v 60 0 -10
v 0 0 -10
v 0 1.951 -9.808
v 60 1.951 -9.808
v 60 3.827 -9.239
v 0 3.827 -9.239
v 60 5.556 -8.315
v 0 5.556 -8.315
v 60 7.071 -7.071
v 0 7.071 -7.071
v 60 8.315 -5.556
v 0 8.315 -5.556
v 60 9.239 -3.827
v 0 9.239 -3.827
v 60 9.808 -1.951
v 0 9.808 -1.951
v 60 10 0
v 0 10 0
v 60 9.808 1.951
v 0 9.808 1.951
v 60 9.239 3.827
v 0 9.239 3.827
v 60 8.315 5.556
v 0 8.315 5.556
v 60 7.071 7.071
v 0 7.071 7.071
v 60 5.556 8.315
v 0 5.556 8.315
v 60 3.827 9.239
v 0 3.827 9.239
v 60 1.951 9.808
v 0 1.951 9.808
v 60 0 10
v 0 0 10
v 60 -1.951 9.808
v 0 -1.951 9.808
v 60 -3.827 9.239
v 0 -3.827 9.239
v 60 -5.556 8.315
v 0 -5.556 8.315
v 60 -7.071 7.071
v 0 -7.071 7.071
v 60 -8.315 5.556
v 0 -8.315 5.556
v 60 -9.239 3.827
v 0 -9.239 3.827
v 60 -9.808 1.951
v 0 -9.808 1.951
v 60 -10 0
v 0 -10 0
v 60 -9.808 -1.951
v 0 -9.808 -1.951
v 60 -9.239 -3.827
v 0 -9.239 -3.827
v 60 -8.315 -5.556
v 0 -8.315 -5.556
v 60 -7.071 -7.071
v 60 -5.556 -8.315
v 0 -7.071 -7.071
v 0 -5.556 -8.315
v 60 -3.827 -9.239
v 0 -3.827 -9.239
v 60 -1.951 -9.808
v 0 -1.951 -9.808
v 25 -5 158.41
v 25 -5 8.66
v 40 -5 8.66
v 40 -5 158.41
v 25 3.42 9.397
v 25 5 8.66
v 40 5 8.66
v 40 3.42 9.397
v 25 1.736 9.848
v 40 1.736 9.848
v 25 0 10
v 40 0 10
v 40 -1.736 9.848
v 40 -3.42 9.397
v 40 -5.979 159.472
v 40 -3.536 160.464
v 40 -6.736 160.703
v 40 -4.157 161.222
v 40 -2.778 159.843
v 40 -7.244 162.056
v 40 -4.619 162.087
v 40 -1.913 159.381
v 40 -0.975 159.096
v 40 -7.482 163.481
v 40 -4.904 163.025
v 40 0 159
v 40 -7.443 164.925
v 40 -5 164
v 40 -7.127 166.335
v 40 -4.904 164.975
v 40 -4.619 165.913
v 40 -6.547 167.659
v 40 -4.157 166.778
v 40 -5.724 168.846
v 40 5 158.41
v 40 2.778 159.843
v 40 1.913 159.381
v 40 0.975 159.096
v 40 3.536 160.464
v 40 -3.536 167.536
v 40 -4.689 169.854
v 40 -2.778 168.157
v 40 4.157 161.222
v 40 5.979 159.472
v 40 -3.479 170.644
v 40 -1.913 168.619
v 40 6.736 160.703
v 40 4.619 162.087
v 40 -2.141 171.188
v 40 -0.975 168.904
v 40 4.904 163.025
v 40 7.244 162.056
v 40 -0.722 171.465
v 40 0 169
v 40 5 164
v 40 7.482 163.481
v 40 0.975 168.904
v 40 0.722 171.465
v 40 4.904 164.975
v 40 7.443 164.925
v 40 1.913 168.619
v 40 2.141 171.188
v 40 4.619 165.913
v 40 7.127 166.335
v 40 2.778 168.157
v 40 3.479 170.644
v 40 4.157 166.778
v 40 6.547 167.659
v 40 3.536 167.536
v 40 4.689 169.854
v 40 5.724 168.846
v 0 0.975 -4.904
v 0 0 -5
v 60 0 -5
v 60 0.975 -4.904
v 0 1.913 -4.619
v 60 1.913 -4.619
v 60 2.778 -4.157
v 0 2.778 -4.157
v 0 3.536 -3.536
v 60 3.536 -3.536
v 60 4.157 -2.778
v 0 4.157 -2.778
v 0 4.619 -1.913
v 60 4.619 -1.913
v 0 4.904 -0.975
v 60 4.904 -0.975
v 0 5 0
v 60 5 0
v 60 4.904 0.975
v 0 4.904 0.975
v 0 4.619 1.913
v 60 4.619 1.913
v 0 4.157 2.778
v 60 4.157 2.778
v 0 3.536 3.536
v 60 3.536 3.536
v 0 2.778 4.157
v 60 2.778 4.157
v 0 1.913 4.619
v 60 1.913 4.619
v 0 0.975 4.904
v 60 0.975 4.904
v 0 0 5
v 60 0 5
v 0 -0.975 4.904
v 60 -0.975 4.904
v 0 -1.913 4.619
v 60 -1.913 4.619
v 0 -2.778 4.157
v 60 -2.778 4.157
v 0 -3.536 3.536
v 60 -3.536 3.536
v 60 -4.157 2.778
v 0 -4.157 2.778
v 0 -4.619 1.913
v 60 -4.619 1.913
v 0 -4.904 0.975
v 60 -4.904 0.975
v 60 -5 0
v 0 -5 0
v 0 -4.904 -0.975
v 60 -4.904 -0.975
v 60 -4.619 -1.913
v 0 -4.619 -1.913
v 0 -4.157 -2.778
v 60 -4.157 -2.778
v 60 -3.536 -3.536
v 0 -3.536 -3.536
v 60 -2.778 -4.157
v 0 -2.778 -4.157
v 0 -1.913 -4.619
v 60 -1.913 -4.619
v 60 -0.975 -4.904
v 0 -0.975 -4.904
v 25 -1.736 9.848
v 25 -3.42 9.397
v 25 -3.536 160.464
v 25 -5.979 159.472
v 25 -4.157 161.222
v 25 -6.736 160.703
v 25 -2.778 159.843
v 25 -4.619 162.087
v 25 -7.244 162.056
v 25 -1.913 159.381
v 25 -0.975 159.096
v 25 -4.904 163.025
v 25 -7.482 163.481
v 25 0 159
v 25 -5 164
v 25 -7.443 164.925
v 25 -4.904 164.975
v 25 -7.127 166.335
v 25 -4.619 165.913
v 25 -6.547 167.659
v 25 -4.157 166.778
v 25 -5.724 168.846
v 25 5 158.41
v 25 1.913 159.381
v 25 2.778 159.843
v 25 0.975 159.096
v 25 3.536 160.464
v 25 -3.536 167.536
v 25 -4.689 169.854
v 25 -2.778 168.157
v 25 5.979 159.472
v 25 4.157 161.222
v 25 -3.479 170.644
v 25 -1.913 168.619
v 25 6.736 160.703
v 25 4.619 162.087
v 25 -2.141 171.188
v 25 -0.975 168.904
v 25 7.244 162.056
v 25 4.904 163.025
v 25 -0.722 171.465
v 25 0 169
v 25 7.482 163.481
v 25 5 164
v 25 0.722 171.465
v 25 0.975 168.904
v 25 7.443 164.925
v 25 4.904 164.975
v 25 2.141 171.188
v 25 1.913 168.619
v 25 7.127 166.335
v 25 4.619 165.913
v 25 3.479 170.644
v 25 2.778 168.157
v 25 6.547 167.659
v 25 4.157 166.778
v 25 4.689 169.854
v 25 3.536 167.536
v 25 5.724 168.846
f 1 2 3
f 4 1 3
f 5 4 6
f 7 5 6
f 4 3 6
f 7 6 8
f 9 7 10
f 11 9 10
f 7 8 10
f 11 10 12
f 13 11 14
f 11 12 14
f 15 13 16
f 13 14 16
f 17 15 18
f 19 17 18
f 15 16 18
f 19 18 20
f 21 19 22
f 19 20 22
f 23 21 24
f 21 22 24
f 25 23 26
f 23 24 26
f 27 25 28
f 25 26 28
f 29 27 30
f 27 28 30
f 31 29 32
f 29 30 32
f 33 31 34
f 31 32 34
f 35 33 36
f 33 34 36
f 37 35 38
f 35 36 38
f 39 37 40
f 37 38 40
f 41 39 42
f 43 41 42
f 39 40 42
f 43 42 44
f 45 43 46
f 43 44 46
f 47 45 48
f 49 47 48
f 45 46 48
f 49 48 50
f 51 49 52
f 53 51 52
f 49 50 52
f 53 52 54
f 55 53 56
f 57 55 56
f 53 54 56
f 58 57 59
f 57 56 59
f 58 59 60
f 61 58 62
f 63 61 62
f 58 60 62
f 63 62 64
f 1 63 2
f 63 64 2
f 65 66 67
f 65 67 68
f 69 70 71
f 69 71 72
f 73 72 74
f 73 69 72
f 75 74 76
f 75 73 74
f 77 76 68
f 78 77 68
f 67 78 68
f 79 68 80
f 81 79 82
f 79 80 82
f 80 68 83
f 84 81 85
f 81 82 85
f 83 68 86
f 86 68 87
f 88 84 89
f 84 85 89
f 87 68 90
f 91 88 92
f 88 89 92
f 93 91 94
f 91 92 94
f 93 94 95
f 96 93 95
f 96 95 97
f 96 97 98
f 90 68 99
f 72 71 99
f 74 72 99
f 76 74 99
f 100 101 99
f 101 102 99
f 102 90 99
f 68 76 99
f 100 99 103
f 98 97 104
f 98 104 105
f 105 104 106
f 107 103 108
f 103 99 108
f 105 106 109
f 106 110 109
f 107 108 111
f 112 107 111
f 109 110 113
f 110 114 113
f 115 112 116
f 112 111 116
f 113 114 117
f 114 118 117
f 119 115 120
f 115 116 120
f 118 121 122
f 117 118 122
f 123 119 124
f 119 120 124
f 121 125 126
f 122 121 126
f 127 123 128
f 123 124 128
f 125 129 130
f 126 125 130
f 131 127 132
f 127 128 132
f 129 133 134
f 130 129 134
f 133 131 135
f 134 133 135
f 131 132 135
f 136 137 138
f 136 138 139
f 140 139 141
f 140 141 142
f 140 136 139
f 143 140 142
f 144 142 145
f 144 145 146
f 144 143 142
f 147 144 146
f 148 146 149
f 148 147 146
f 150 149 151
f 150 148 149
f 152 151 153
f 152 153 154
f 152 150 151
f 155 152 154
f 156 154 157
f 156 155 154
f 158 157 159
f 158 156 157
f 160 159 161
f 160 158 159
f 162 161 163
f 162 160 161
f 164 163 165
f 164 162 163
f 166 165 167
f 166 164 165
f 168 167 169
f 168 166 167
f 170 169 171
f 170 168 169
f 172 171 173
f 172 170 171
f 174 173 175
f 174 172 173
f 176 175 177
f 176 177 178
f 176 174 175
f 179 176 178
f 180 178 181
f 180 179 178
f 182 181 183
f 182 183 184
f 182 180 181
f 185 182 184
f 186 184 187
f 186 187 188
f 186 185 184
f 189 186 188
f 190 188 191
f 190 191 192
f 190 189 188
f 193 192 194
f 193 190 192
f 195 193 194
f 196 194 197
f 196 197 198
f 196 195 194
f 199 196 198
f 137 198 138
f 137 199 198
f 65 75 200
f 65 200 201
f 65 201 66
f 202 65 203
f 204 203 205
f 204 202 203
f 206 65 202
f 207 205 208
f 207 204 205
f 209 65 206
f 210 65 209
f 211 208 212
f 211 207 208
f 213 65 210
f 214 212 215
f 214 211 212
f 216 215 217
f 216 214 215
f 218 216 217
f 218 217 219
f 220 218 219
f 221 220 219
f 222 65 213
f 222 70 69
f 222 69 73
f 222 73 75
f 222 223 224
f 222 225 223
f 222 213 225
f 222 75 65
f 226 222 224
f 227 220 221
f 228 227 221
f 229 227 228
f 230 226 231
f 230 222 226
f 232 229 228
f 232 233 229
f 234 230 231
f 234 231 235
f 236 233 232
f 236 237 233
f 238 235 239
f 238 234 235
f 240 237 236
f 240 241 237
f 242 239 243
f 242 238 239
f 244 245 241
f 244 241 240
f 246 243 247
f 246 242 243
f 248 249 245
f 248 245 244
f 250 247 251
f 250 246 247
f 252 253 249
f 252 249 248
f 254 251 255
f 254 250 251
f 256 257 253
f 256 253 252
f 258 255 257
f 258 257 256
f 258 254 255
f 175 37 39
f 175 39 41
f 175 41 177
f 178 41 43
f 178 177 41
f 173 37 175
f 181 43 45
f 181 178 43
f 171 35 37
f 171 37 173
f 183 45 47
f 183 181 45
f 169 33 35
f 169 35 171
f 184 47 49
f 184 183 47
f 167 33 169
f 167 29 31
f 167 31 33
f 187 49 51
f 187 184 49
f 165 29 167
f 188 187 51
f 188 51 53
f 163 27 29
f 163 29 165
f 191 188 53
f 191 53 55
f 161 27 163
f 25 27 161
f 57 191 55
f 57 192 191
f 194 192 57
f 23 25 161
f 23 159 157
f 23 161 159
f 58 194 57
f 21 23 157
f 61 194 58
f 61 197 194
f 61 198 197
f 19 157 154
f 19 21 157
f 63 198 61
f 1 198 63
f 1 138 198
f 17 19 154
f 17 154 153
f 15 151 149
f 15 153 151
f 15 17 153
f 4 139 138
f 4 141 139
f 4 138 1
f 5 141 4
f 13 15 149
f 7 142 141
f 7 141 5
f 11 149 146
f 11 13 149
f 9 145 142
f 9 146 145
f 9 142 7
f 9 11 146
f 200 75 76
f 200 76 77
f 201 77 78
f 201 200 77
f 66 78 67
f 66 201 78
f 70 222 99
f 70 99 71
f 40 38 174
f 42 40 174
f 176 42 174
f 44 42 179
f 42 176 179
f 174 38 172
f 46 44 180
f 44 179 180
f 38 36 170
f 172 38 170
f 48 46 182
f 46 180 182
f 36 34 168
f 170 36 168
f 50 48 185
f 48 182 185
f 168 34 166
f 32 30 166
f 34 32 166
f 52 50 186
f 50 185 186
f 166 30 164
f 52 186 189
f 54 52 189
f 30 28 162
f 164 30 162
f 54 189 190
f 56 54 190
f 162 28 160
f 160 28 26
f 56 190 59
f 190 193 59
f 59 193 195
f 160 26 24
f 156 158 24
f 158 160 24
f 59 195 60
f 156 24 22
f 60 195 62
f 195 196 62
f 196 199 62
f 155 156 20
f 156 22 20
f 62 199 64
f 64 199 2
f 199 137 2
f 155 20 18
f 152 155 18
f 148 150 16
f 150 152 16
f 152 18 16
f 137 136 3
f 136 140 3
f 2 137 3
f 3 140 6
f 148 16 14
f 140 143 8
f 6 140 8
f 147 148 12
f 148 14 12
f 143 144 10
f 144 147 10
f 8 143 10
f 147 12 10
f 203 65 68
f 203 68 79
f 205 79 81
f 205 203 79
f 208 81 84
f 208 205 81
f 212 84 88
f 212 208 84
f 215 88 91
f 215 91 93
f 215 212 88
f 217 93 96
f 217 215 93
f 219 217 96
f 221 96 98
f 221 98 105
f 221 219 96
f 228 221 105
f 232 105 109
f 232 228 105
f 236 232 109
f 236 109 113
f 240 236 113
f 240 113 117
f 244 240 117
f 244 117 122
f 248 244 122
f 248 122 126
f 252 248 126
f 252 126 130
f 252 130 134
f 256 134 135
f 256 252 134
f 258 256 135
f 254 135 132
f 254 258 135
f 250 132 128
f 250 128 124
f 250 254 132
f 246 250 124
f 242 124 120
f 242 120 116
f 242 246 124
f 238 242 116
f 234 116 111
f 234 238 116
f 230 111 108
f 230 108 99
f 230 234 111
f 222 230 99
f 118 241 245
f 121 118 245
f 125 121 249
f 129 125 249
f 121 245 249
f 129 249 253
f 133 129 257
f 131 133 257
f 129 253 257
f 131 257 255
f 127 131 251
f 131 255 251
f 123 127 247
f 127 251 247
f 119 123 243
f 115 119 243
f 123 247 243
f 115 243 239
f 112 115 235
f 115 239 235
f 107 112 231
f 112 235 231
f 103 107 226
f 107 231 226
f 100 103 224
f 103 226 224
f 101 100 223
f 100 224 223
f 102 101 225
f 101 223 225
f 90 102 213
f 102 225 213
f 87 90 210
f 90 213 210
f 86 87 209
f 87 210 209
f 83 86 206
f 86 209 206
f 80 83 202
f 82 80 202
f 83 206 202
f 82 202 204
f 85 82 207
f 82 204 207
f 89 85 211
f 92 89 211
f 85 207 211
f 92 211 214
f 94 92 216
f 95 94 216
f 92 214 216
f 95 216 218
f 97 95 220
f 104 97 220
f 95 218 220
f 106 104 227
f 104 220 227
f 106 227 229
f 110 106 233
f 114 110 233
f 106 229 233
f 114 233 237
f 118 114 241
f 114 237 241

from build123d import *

# Parameters (mm, degrees)
SKETCH1_R           = 10
SKETCH1_R_2         = 5
BOSS_EXTRUDE1_DEPTH = 60
SKETCH2_R           = 5
BOSS_EXTRUDE2_DEPTH = 15


with BuildPart() as part:
    # Sketch1 → Boss-Extrude1 (new body)
    with BuildSketch(Plane(origin=(0, 0, 0), x_dir=(0, 0, -1), z_dir=(1, 0, 0))):
        Circle(SKETCH1_R)
        Circle(SKETCH1_R_2, mode=Mode.SUBTRACT)
    extrude(amount=BOSS_EXTRUDE1_DEPTH)


with BuildPart() as body_2:
    # Sketch2 → Boss-Extrude2 (new body)
    with BuildSketch(Plane.ZY):
        with BuildLine():
            ThreePointArc((158.409830056, -5), (171.5, 0), (158.409830056, 5))
            Line((158.409830056, 5), (8.660254038, 5))
            ThreePointArc((8.660254038, 5), (9.659258263, 2.588190451), (10, 0))
            ThreePointArc((10, 0), (9.659258263, -2.588190451), (8.660254038, -5))
            Line((8.660254038, -5), (158.409830056, -5))
        make_face()
        with Locations((164, 0)):
            Circle(SKETCH2_R, mode=Mode.SUBTRACT)
    extrude(amount=-BOSS_EXTRUDE2_DEPTH)


with BuildPart() as body_2_1:
    # Body-Move/Copy1: moved
    add(body_2.part.moved(Location((25, 0, 0))))


solid = Compound([part.part, body_2_1.part])
